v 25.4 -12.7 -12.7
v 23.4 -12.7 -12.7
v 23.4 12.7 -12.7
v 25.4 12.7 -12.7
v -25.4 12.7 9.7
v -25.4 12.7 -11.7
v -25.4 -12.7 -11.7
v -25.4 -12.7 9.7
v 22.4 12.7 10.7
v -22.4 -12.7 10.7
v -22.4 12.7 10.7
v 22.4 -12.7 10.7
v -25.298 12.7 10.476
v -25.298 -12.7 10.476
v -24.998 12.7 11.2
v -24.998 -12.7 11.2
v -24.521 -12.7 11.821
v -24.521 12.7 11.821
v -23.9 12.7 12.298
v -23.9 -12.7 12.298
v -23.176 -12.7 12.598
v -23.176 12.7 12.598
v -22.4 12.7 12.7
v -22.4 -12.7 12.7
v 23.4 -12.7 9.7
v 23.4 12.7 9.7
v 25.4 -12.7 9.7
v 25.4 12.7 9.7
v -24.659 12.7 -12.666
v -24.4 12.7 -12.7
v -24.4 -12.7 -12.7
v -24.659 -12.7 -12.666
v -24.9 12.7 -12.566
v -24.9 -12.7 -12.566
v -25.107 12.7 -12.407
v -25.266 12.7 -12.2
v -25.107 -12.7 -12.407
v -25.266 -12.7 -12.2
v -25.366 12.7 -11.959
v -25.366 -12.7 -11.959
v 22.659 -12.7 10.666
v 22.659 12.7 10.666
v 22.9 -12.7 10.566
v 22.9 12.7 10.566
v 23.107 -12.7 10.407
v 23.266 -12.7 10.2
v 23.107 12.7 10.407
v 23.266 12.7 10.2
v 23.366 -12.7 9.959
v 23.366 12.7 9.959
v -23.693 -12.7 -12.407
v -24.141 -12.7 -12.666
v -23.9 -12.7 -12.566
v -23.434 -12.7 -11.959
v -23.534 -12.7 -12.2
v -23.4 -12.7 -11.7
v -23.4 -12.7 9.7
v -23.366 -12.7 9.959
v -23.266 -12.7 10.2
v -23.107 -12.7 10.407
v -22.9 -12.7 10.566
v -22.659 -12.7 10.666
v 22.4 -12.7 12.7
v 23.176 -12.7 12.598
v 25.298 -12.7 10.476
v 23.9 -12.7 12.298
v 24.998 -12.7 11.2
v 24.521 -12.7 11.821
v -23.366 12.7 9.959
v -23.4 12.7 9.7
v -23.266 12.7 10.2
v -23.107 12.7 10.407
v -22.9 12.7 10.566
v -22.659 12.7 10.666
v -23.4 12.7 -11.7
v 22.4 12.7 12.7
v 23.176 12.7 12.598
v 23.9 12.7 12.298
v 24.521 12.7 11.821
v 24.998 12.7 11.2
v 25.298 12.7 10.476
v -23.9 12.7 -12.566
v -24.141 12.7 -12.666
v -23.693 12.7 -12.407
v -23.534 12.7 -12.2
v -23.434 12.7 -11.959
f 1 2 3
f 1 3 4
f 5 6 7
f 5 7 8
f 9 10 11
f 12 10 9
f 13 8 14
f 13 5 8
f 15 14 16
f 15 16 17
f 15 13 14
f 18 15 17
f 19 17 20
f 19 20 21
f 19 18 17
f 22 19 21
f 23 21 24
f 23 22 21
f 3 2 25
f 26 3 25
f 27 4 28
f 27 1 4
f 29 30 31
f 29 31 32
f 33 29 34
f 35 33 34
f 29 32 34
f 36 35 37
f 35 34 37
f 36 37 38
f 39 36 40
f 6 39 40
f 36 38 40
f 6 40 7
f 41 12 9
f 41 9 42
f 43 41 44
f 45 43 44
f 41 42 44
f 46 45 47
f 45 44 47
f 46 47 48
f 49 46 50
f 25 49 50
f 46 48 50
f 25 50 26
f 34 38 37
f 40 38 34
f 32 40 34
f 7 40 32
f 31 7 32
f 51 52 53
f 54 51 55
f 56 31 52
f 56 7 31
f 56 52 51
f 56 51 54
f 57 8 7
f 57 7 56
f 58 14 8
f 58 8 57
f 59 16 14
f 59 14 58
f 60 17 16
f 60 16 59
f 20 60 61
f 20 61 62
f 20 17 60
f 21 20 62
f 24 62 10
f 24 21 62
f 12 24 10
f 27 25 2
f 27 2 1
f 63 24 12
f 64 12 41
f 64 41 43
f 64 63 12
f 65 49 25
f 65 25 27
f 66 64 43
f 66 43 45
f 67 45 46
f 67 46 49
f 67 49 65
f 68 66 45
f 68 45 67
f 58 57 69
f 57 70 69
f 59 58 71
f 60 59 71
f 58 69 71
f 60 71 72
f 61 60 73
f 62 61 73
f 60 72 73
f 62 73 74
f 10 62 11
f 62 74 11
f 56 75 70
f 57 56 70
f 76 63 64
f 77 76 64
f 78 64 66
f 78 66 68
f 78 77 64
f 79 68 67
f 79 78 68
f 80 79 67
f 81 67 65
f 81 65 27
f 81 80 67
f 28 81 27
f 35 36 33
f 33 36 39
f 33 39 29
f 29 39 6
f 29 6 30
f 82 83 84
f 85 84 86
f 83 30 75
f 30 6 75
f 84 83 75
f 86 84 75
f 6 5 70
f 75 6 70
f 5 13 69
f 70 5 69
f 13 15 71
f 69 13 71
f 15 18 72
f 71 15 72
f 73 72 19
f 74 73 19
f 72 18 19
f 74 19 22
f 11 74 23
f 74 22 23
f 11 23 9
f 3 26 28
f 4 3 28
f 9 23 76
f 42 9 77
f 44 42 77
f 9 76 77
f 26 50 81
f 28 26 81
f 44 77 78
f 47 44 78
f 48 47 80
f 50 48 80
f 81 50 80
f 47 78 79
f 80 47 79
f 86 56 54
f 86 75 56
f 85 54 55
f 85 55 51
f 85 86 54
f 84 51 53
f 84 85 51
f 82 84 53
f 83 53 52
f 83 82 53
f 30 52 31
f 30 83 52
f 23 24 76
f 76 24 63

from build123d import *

# Parameters (mm, degrees)
F0_W     = 50.8
F0_H     = 25.4
F1_DEPTH = 12.7
F2_W     = 46.8
F2_H     = 23.4
F3_DEPTH = 25.4
F4_R     = 3
F5_R     = 1
F6_R     = 0.99999


# Not quite as in the source:
# - a fillet or chamfer is up to 0.001 mm smaller than in the source, because OpenCascade refuses the exact size


with BuildPart() as f1:
    # F0 (on Front) → F1 (new body, symmetric)
    with BuildSketch(Plane.XZ):
        Rectangle(F0_W, F0_H)
    extrude(amount=F1_DEPTH, both=True)

    # F2 (on face) → F3 (cut, through all)
    with BuildSketch(Plane.XZ.offset(12.7)):
        with Locations((0, -1)):
            Rectangle(F2_W, F2_H)
    extrude(amount=-F3_DEPTH, mode=Mode.SUBTRACT)

    # F4
    f4_edges = [f1.edges().sort_by_distance(p)[0] for p in [
        (-25.4, 0, 12.7),
        (25.4, 0, 12.7),
    ]]
    fillet(f4_edges, radius=F4_R)

    # F5
    f5_edges = [f1.edges().sort_by_distance(p)[0] for p in [
        (-23.4, 0, 10.7),
        (23.4, 0, 10.7),
    ]]
    fillet(f5_edges, radius=F5_R)

    # F6 (radius 1 in the source; OpenCascade refuses exactly that, so slightly less here)
    f6_edges = [f1.edges().sort_by_distance(p)[0] for p in [
        (-25.4, 0, -12.7),
        (-23.4, 0, -12.7),
    ]]
    fillet(f6_edges, radius=F6_R)


solid = f1.part
